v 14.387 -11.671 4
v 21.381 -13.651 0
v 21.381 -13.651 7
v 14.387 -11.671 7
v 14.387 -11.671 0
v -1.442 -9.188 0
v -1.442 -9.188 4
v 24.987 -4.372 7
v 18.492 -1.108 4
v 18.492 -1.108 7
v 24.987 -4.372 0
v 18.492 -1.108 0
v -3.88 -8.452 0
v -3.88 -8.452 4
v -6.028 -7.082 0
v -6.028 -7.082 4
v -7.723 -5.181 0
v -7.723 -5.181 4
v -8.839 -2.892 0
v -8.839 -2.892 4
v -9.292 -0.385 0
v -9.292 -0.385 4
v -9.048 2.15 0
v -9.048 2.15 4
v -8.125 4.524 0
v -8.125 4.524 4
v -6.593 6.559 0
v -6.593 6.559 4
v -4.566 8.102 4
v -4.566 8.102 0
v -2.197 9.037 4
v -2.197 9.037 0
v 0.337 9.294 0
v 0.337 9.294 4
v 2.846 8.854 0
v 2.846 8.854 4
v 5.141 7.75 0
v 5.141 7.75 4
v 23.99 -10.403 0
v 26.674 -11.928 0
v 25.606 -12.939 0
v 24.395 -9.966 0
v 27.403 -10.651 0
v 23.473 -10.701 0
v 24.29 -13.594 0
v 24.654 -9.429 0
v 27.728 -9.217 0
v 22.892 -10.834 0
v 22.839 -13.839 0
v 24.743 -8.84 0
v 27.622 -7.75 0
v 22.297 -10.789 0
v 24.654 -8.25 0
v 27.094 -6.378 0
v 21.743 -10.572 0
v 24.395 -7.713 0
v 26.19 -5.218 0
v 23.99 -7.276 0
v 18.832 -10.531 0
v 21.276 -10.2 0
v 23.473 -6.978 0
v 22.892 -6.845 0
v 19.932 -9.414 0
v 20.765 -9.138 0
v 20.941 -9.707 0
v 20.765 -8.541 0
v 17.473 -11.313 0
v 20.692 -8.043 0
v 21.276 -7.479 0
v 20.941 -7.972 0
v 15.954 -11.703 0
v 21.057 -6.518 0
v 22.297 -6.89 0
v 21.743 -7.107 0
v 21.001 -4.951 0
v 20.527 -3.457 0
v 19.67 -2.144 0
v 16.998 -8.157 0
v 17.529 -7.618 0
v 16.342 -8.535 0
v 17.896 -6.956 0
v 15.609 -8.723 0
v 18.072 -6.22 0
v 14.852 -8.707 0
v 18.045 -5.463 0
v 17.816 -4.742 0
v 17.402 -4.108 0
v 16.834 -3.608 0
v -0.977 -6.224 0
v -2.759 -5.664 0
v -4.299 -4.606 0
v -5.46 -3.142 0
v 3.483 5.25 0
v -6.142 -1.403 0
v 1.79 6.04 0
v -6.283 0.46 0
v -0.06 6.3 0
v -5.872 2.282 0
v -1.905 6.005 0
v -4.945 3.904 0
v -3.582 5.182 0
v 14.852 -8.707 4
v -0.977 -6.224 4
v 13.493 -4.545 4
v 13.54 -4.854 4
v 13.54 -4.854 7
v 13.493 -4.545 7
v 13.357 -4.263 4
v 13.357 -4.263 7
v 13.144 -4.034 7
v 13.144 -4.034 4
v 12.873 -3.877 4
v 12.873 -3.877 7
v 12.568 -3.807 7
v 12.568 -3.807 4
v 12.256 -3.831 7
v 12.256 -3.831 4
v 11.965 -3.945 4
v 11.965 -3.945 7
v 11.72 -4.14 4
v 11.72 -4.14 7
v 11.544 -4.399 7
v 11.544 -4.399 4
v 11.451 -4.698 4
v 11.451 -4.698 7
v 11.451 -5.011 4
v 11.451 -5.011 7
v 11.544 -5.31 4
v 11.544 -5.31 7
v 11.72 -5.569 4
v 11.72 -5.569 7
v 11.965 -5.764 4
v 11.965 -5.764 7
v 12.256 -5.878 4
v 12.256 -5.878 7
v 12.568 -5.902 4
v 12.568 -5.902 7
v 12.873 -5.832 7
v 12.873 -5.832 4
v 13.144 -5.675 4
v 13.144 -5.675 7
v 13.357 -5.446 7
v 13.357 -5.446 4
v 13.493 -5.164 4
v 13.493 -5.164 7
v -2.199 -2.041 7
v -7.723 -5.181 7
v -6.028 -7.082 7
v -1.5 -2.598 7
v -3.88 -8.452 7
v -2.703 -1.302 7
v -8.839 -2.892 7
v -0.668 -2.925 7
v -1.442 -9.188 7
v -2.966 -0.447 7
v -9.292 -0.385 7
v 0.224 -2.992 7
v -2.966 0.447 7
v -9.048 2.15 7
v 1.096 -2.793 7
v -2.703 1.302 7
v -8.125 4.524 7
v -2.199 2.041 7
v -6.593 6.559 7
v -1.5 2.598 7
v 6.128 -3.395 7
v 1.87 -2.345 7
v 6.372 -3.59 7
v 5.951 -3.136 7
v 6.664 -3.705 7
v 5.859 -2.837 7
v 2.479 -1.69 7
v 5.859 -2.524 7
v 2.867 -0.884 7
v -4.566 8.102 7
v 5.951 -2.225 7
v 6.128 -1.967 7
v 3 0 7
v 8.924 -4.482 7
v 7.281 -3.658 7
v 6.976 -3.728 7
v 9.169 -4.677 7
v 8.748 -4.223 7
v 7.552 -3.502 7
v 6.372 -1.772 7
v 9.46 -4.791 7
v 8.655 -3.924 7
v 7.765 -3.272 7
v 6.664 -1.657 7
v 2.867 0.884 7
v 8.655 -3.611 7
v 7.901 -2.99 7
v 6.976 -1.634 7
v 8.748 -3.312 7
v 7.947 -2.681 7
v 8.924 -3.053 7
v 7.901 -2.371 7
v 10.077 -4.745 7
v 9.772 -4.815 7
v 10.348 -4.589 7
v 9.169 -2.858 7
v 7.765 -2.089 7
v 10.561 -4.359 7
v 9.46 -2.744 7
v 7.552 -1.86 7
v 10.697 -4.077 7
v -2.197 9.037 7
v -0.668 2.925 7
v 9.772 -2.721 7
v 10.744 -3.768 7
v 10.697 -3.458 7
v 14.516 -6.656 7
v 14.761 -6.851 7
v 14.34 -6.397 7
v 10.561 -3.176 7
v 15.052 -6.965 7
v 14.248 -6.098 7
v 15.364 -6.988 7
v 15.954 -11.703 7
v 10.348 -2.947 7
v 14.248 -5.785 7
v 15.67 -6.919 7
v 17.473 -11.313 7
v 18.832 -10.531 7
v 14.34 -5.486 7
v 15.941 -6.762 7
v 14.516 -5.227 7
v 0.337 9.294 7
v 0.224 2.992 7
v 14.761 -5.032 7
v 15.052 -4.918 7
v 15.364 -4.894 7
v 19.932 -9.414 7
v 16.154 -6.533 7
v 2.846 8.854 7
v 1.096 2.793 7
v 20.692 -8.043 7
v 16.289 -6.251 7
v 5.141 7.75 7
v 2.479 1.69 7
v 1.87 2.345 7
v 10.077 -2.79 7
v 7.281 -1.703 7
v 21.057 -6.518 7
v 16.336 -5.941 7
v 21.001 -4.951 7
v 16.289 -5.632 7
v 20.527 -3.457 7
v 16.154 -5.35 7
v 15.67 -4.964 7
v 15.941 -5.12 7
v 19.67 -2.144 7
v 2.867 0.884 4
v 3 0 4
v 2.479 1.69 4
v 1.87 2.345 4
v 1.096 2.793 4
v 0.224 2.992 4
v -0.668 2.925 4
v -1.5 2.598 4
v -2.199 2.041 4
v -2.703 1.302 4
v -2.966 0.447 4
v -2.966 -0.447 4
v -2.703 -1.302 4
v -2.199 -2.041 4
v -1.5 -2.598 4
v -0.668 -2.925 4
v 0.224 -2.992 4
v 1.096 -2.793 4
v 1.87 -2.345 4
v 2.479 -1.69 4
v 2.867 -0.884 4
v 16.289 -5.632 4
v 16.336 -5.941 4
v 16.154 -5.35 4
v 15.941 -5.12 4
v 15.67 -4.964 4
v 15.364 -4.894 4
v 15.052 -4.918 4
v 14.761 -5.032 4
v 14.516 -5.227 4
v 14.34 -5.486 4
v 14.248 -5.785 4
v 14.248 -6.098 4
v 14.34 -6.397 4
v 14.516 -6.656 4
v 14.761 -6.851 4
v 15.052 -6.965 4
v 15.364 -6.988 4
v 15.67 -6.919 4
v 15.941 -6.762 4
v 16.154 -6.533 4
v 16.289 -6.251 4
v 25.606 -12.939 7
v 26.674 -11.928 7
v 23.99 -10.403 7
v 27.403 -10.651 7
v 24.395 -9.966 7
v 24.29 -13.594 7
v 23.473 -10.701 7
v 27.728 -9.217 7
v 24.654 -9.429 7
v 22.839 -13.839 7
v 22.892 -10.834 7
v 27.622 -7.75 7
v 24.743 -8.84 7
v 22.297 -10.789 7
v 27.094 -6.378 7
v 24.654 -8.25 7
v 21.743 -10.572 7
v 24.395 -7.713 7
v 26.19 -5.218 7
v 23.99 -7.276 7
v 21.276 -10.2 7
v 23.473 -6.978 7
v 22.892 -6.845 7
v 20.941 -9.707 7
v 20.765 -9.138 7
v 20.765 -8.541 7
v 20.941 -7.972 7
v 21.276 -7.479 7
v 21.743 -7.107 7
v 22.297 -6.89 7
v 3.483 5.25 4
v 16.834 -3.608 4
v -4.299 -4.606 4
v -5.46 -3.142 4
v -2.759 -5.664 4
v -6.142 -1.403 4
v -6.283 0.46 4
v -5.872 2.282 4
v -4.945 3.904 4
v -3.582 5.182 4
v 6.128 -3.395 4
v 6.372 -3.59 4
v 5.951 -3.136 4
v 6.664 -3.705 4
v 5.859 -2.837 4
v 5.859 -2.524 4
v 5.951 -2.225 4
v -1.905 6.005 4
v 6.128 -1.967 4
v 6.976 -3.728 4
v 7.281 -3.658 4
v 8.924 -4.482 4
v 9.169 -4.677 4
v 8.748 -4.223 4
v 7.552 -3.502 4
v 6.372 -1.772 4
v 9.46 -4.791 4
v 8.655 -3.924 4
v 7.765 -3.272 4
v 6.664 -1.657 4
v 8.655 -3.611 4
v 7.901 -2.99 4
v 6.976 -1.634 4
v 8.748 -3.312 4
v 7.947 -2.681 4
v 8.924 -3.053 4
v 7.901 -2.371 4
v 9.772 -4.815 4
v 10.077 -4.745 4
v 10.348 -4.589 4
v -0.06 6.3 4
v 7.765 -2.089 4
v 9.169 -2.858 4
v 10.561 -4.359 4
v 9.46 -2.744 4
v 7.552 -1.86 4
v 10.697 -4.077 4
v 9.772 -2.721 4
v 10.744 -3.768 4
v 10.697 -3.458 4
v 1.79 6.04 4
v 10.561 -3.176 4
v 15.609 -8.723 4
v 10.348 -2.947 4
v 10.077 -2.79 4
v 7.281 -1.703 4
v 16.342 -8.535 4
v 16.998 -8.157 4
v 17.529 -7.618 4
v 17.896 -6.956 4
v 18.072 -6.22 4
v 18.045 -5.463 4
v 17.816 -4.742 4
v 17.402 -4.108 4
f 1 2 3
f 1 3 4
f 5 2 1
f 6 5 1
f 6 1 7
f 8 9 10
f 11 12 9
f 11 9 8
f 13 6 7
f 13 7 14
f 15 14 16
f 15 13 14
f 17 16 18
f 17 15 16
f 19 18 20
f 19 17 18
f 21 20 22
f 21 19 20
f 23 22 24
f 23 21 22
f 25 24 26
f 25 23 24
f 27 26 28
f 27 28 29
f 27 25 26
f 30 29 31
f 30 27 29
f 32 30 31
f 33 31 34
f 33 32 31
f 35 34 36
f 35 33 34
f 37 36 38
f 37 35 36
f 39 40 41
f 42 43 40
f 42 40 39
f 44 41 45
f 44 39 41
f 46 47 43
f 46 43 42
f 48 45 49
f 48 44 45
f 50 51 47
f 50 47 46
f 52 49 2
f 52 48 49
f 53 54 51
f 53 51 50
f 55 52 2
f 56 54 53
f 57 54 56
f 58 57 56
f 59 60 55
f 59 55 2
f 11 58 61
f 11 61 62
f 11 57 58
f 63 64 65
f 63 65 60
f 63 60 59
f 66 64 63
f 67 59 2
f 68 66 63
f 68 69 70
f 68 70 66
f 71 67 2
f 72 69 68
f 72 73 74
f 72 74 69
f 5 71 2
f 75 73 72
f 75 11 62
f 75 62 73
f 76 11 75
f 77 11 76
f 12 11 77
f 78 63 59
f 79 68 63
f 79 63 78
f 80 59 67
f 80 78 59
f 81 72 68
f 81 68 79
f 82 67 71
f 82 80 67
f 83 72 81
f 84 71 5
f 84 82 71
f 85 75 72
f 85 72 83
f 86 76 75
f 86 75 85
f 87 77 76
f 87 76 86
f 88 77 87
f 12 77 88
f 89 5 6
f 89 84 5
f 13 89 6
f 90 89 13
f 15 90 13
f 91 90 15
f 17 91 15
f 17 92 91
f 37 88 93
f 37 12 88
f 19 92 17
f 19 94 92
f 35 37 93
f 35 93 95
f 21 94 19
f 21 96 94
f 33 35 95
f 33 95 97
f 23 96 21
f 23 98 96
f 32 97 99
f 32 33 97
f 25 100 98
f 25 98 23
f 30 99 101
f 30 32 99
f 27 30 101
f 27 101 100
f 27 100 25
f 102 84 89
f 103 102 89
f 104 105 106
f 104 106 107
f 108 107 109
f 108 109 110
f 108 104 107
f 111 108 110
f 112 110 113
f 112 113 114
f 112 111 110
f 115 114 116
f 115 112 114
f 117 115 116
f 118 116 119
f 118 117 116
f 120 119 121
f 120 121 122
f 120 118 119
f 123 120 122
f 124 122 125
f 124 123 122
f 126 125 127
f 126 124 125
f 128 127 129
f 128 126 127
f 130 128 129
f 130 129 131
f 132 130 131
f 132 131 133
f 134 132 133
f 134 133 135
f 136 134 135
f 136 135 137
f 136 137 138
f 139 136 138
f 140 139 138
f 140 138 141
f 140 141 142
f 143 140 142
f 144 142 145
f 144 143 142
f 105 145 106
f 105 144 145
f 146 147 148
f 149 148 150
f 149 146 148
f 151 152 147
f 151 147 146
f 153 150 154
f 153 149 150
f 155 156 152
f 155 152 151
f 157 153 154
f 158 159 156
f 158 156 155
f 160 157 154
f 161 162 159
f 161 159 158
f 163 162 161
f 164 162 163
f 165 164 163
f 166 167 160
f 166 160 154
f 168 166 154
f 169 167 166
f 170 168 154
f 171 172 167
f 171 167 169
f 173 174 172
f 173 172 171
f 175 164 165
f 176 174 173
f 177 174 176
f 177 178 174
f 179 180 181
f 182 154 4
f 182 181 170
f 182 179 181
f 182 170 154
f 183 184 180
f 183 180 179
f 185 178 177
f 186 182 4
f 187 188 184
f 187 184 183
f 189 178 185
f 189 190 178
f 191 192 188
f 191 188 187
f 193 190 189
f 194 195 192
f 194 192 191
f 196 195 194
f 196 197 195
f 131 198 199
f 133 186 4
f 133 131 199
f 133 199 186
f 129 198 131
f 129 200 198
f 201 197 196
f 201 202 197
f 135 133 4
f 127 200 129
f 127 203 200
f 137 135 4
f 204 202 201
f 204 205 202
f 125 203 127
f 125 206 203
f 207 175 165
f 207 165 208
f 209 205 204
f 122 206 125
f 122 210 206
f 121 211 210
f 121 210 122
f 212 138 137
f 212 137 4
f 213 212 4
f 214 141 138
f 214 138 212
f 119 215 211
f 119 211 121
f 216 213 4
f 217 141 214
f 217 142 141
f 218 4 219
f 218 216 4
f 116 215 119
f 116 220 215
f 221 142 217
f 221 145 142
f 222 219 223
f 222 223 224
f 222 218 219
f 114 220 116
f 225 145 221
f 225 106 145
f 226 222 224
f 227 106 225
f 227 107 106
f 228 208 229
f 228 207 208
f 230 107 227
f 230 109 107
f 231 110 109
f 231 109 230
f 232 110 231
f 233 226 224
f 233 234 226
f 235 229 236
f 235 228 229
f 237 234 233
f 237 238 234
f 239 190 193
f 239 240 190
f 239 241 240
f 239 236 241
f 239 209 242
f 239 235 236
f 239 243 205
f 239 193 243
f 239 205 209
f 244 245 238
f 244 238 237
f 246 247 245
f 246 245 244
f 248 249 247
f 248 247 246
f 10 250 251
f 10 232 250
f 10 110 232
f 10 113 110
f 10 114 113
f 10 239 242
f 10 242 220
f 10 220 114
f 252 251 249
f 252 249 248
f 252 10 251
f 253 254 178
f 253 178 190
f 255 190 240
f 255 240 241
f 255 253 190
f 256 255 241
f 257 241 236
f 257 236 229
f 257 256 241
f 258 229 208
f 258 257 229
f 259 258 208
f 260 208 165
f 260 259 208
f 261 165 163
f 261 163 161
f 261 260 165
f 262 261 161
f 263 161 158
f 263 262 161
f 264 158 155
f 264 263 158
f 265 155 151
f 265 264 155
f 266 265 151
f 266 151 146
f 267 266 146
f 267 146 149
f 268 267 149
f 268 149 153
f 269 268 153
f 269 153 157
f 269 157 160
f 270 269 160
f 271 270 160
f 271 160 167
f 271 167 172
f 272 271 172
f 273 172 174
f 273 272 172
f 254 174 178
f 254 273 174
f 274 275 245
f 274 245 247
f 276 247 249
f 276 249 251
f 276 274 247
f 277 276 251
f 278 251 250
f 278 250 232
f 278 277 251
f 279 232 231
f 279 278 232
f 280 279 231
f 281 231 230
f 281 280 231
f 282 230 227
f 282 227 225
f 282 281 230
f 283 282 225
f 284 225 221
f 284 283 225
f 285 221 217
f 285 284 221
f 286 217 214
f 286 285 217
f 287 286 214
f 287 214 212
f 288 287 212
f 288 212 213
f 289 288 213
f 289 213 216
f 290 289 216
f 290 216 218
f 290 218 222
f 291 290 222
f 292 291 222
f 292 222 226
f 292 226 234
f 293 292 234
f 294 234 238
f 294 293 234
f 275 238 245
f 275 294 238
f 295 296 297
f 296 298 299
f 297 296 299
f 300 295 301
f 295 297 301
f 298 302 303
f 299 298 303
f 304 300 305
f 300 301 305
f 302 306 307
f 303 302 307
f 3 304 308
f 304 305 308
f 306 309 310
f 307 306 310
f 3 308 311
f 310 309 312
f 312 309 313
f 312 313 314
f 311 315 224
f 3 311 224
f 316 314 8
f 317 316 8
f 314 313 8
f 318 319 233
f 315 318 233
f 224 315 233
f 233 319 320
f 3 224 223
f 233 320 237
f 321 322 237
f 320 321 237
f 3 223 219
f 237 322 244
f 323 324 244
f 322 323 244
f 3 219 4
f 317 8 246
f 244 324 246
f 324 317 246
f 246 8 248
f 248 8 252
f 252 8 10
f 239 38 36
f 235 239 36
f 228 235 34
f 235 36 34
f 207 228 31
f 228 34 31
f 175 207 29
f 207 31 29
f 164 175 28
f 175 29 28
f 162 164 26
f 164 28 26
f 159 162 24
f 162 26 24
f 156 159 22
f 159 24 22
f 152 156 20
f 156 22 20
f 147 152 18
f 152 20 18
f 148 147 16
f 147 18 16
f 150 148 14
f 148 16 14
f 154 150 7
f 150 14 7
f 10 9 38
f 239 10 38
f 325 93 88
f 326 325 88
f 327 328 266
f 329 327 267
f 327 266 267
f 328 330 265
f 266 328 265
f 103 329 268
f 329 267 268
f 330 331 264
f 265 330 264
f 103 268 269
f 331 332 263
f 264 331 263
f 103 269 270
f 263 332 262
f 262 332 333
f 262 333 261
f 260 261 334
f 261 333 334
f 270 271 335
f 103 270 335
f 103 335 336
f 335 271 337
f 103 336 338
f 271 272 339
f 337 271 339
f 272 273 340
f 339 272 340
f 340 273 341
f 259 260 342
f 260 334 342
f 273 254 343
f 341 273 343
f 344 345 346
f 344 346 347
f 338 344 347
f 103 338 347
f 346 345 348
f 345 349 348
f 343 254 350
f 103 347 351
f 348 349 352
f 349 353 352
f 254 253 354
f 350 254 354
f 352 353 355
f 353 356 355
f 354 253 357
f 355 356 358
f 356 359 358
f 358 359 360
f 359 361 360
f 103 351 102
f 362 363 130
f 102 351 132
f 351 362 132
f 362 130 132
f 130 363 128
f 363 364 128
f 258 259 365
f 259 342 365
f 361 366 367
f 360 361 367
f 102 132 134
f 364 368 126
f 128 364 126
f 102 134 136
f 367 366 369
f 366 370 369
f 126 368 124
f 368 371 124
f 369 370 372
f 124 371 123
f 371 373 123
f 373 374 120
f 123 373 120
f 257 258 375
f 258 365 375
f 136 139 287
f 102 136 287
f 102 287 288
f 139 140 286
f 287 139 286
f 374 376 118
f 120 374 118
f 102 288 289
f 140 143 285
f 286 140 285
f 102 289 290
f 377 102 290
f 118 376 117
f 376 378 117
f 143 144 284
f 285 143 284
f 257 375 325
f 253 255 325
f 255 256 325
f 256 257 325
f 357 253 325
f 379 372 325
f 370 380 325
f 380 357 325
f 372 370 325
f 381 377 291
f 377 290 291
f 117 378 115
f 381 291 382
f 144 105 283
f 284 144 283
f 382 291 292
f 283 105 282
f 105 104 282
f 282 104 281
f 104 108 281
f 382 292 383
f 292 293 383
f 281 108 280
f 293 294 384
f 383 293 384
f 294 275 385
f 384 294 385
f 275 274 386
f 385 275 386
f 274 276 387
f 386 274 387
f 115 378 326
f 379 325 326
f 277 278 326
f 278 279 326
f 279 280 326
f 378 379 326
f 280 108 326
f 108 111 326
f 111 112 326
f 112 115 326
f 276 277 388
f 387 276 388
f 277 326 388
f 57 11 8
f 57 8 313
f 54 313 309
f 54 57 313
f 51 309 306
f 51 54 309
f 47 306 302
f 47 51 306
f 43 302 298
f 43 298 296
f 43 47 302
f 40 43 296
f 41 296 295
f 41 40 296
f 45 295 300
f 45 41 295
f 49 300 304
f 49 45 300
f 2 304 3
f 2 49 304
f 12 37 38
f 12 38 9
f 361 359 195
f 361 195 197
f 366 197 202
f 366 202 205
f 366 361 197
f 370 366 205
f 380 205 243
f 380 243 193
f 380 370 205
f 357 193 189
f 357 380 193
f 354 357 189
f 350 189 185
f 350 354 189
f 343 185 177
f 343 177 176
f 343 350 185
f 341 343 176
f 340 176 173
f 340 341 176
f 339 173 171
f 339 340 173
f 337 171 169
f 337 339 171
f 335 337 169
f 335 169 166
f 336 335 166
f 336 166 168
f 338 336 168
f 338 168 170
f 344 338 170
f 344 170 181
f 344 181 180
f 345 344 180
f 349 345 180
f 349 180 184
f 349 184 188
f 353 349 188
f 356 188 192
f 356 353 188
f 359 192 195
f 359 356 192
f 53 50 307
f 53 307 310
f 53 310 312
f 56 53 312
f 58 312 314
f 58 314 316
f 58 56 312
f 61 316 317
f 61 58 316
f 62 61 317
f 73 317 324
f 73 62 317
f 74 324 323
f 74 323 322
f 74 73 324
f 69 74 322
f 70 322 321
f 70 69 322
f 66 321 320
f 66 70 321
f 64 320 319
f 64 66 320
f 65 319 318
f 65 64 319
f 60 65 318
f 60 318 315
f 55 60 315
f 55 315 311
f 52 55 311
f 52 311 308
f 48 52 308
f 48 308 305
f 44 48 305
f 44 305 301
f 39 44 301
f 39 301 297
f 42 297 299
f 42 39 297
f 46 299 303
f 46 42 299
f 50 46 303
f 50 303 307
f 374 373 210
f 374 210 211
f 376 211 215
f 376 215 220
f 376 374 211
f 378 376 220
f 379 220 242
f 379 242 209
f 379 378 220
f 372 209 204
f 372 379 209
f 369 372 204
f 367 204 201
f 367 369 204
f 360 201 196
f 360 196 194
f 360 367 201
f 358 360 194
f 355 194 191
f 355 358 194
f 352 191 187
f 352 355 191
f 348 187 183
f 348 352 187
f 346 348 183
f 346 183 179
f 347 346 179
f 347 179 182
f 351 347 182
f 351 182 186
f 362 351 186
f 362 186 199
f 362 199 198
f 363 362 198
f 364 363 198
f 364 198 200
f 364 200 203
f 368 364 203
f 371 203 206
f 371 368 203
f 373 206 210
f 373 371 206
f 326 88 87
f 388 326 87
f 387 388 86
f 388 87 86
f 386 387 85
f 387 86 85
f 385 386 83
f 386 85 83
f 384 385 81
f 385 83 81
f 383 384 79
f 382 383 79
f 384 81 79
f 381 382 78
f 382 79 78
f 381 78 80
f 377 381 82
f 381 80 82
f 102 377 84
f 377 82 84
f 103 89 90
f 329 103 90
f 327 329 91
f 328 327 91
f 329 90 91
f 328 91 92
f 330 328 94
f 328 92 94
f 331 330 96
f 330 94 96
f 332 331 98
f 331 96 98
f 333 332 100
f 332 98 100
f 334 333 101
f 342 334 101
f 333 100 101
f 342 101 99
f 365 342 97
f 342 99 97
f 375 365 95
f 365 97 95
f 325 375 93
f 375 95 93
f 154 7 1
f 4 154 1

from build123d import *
from build123d.topology import SkipClean

# Parameters (mm, degrees)
EXTRUDE_1_DEPTH = 4
SKETCH_2_R      = 3
SKETCH_2_R_2    = 1.05
EXTRUDE_2_DEPTH = 3
EXTRUDE_START   = -7
SKETCH_3_R      = 2
EXTRUDE_3_DEPTH = 7


with BuildPart() as part:
    # Эскиз1 → Бобышка-Вытянуть1 (new body)
    with BuildSketch(Plane.XY):
        with BuildLine():
            Line((14.386891947, -11.67121845), (-1.44161316, -9.187586816))
            ThreePointArc((-1.44161316, -9.187586816), (-8.668259234, 3.369166345), (5.141479906, 7.74952801))
            Line((5.141479906, 7.74952801), (18.492476869, -1.108286623))
            ThreePointArc((18.492476869, -1.108286623), (20.691973654, -8.042526113), (14.386891947, -11.67121845))
        make_face()
        with BuildLine():
            Line((3.482938001, 5.249680265), (16.833934964, -3.608134368))
            ThreePointArc((16.833934964, -3.608134368), (17.895760998, -6.95569826), (14.85192845, -8.707480768))
            Line((14.85192845, -8.707480768), (-0.976576656, -6.223849133))
            ThreePointArc((-0.976576656, -6.223849133), (-5.872046578, 2.282338492), (3.482938001, 5.249680265))
        make_face(mode=Mode.SUBTRACT)
    extrude(amount=EXTRUDE_1_DEPTH)

    # Эскиз2 → Бобышка-Вытянуть2 (add)
    with SkipClean():  # the faces are left unmerged after this step: merging them gives an invalid solid
        with BuildSketch(Plane.XY.offset(4)):
            with BuildLine():
                Line((-1.44161316, -9.187586816), (14.386891947, -11.67121845))
                ThreePointArc((14.386891947, -11.67121845), (20.691973654, -8.042526113), (18.492476869, -1.108286623))
                Line((18.492476869, -1.108286623), (5.141479906, 7.74952801))
                ThreePointArc((5.141479906, 7.74952801), (-8.668259234, 3.369166345), (-1.44161316, -9.187586816))
            make_face()
            Circle(SKETCH_2_R, mode=Mode.SUBTRACT)
            with Locations((6.897324552, -2.680842038)):
                Circle(SKETCH_2_R_2, mode=Mode.SUBTRACT)
            with Locations((9.693537208, -3.767669891)):
                Circle(SKETCH_2_R_2, mode=Mode.SUBTRACT)
            with Locations((12.489749864, -4.854497744)):
                Circle(SKETCH_2_R_2, mode=Mode.SUBTRACT)
            with Locations((15.28596252, -5.941325597)):
                Circle(SKETCH_2_R_2, mode=Mode.SUBTRACT)
        extrude(amount=EXTRUDE_2_DEPTH)

    # Эскиз3 → Бобышка-Вытянуть3 (add)
    with SkipClean():  # the faces are left unmerged after this step: merging them gives an invalid solid
        with BuildSketch(Plane.XY.offset(7).offset(EXTRUDE_START)):
            with BuildLine():
                Line((18.492476869, -1.108286623), (24.987431668, -4.371825212))
                ThreePointArc((24.987431668, -4.371825212), (27.402884029, -10.650912961), (21.380978505, -13.650580764))
                Line((21.380978505, -13.650580764), (14.386891947, -11.67121845))
                ThreePointArc((14.386891947, -11.67121845), (20.691973654, -8.042526113), (18.492476869, -1.108286623))
            make_face()
            with Locations((22.742529602, -8.839533206)):
                Circle(SKETCH_3_R, mode=Mode.SUBTRACT)
        extrude(amount=EXTRUDE_3_DEPTH)


solid = part.part
